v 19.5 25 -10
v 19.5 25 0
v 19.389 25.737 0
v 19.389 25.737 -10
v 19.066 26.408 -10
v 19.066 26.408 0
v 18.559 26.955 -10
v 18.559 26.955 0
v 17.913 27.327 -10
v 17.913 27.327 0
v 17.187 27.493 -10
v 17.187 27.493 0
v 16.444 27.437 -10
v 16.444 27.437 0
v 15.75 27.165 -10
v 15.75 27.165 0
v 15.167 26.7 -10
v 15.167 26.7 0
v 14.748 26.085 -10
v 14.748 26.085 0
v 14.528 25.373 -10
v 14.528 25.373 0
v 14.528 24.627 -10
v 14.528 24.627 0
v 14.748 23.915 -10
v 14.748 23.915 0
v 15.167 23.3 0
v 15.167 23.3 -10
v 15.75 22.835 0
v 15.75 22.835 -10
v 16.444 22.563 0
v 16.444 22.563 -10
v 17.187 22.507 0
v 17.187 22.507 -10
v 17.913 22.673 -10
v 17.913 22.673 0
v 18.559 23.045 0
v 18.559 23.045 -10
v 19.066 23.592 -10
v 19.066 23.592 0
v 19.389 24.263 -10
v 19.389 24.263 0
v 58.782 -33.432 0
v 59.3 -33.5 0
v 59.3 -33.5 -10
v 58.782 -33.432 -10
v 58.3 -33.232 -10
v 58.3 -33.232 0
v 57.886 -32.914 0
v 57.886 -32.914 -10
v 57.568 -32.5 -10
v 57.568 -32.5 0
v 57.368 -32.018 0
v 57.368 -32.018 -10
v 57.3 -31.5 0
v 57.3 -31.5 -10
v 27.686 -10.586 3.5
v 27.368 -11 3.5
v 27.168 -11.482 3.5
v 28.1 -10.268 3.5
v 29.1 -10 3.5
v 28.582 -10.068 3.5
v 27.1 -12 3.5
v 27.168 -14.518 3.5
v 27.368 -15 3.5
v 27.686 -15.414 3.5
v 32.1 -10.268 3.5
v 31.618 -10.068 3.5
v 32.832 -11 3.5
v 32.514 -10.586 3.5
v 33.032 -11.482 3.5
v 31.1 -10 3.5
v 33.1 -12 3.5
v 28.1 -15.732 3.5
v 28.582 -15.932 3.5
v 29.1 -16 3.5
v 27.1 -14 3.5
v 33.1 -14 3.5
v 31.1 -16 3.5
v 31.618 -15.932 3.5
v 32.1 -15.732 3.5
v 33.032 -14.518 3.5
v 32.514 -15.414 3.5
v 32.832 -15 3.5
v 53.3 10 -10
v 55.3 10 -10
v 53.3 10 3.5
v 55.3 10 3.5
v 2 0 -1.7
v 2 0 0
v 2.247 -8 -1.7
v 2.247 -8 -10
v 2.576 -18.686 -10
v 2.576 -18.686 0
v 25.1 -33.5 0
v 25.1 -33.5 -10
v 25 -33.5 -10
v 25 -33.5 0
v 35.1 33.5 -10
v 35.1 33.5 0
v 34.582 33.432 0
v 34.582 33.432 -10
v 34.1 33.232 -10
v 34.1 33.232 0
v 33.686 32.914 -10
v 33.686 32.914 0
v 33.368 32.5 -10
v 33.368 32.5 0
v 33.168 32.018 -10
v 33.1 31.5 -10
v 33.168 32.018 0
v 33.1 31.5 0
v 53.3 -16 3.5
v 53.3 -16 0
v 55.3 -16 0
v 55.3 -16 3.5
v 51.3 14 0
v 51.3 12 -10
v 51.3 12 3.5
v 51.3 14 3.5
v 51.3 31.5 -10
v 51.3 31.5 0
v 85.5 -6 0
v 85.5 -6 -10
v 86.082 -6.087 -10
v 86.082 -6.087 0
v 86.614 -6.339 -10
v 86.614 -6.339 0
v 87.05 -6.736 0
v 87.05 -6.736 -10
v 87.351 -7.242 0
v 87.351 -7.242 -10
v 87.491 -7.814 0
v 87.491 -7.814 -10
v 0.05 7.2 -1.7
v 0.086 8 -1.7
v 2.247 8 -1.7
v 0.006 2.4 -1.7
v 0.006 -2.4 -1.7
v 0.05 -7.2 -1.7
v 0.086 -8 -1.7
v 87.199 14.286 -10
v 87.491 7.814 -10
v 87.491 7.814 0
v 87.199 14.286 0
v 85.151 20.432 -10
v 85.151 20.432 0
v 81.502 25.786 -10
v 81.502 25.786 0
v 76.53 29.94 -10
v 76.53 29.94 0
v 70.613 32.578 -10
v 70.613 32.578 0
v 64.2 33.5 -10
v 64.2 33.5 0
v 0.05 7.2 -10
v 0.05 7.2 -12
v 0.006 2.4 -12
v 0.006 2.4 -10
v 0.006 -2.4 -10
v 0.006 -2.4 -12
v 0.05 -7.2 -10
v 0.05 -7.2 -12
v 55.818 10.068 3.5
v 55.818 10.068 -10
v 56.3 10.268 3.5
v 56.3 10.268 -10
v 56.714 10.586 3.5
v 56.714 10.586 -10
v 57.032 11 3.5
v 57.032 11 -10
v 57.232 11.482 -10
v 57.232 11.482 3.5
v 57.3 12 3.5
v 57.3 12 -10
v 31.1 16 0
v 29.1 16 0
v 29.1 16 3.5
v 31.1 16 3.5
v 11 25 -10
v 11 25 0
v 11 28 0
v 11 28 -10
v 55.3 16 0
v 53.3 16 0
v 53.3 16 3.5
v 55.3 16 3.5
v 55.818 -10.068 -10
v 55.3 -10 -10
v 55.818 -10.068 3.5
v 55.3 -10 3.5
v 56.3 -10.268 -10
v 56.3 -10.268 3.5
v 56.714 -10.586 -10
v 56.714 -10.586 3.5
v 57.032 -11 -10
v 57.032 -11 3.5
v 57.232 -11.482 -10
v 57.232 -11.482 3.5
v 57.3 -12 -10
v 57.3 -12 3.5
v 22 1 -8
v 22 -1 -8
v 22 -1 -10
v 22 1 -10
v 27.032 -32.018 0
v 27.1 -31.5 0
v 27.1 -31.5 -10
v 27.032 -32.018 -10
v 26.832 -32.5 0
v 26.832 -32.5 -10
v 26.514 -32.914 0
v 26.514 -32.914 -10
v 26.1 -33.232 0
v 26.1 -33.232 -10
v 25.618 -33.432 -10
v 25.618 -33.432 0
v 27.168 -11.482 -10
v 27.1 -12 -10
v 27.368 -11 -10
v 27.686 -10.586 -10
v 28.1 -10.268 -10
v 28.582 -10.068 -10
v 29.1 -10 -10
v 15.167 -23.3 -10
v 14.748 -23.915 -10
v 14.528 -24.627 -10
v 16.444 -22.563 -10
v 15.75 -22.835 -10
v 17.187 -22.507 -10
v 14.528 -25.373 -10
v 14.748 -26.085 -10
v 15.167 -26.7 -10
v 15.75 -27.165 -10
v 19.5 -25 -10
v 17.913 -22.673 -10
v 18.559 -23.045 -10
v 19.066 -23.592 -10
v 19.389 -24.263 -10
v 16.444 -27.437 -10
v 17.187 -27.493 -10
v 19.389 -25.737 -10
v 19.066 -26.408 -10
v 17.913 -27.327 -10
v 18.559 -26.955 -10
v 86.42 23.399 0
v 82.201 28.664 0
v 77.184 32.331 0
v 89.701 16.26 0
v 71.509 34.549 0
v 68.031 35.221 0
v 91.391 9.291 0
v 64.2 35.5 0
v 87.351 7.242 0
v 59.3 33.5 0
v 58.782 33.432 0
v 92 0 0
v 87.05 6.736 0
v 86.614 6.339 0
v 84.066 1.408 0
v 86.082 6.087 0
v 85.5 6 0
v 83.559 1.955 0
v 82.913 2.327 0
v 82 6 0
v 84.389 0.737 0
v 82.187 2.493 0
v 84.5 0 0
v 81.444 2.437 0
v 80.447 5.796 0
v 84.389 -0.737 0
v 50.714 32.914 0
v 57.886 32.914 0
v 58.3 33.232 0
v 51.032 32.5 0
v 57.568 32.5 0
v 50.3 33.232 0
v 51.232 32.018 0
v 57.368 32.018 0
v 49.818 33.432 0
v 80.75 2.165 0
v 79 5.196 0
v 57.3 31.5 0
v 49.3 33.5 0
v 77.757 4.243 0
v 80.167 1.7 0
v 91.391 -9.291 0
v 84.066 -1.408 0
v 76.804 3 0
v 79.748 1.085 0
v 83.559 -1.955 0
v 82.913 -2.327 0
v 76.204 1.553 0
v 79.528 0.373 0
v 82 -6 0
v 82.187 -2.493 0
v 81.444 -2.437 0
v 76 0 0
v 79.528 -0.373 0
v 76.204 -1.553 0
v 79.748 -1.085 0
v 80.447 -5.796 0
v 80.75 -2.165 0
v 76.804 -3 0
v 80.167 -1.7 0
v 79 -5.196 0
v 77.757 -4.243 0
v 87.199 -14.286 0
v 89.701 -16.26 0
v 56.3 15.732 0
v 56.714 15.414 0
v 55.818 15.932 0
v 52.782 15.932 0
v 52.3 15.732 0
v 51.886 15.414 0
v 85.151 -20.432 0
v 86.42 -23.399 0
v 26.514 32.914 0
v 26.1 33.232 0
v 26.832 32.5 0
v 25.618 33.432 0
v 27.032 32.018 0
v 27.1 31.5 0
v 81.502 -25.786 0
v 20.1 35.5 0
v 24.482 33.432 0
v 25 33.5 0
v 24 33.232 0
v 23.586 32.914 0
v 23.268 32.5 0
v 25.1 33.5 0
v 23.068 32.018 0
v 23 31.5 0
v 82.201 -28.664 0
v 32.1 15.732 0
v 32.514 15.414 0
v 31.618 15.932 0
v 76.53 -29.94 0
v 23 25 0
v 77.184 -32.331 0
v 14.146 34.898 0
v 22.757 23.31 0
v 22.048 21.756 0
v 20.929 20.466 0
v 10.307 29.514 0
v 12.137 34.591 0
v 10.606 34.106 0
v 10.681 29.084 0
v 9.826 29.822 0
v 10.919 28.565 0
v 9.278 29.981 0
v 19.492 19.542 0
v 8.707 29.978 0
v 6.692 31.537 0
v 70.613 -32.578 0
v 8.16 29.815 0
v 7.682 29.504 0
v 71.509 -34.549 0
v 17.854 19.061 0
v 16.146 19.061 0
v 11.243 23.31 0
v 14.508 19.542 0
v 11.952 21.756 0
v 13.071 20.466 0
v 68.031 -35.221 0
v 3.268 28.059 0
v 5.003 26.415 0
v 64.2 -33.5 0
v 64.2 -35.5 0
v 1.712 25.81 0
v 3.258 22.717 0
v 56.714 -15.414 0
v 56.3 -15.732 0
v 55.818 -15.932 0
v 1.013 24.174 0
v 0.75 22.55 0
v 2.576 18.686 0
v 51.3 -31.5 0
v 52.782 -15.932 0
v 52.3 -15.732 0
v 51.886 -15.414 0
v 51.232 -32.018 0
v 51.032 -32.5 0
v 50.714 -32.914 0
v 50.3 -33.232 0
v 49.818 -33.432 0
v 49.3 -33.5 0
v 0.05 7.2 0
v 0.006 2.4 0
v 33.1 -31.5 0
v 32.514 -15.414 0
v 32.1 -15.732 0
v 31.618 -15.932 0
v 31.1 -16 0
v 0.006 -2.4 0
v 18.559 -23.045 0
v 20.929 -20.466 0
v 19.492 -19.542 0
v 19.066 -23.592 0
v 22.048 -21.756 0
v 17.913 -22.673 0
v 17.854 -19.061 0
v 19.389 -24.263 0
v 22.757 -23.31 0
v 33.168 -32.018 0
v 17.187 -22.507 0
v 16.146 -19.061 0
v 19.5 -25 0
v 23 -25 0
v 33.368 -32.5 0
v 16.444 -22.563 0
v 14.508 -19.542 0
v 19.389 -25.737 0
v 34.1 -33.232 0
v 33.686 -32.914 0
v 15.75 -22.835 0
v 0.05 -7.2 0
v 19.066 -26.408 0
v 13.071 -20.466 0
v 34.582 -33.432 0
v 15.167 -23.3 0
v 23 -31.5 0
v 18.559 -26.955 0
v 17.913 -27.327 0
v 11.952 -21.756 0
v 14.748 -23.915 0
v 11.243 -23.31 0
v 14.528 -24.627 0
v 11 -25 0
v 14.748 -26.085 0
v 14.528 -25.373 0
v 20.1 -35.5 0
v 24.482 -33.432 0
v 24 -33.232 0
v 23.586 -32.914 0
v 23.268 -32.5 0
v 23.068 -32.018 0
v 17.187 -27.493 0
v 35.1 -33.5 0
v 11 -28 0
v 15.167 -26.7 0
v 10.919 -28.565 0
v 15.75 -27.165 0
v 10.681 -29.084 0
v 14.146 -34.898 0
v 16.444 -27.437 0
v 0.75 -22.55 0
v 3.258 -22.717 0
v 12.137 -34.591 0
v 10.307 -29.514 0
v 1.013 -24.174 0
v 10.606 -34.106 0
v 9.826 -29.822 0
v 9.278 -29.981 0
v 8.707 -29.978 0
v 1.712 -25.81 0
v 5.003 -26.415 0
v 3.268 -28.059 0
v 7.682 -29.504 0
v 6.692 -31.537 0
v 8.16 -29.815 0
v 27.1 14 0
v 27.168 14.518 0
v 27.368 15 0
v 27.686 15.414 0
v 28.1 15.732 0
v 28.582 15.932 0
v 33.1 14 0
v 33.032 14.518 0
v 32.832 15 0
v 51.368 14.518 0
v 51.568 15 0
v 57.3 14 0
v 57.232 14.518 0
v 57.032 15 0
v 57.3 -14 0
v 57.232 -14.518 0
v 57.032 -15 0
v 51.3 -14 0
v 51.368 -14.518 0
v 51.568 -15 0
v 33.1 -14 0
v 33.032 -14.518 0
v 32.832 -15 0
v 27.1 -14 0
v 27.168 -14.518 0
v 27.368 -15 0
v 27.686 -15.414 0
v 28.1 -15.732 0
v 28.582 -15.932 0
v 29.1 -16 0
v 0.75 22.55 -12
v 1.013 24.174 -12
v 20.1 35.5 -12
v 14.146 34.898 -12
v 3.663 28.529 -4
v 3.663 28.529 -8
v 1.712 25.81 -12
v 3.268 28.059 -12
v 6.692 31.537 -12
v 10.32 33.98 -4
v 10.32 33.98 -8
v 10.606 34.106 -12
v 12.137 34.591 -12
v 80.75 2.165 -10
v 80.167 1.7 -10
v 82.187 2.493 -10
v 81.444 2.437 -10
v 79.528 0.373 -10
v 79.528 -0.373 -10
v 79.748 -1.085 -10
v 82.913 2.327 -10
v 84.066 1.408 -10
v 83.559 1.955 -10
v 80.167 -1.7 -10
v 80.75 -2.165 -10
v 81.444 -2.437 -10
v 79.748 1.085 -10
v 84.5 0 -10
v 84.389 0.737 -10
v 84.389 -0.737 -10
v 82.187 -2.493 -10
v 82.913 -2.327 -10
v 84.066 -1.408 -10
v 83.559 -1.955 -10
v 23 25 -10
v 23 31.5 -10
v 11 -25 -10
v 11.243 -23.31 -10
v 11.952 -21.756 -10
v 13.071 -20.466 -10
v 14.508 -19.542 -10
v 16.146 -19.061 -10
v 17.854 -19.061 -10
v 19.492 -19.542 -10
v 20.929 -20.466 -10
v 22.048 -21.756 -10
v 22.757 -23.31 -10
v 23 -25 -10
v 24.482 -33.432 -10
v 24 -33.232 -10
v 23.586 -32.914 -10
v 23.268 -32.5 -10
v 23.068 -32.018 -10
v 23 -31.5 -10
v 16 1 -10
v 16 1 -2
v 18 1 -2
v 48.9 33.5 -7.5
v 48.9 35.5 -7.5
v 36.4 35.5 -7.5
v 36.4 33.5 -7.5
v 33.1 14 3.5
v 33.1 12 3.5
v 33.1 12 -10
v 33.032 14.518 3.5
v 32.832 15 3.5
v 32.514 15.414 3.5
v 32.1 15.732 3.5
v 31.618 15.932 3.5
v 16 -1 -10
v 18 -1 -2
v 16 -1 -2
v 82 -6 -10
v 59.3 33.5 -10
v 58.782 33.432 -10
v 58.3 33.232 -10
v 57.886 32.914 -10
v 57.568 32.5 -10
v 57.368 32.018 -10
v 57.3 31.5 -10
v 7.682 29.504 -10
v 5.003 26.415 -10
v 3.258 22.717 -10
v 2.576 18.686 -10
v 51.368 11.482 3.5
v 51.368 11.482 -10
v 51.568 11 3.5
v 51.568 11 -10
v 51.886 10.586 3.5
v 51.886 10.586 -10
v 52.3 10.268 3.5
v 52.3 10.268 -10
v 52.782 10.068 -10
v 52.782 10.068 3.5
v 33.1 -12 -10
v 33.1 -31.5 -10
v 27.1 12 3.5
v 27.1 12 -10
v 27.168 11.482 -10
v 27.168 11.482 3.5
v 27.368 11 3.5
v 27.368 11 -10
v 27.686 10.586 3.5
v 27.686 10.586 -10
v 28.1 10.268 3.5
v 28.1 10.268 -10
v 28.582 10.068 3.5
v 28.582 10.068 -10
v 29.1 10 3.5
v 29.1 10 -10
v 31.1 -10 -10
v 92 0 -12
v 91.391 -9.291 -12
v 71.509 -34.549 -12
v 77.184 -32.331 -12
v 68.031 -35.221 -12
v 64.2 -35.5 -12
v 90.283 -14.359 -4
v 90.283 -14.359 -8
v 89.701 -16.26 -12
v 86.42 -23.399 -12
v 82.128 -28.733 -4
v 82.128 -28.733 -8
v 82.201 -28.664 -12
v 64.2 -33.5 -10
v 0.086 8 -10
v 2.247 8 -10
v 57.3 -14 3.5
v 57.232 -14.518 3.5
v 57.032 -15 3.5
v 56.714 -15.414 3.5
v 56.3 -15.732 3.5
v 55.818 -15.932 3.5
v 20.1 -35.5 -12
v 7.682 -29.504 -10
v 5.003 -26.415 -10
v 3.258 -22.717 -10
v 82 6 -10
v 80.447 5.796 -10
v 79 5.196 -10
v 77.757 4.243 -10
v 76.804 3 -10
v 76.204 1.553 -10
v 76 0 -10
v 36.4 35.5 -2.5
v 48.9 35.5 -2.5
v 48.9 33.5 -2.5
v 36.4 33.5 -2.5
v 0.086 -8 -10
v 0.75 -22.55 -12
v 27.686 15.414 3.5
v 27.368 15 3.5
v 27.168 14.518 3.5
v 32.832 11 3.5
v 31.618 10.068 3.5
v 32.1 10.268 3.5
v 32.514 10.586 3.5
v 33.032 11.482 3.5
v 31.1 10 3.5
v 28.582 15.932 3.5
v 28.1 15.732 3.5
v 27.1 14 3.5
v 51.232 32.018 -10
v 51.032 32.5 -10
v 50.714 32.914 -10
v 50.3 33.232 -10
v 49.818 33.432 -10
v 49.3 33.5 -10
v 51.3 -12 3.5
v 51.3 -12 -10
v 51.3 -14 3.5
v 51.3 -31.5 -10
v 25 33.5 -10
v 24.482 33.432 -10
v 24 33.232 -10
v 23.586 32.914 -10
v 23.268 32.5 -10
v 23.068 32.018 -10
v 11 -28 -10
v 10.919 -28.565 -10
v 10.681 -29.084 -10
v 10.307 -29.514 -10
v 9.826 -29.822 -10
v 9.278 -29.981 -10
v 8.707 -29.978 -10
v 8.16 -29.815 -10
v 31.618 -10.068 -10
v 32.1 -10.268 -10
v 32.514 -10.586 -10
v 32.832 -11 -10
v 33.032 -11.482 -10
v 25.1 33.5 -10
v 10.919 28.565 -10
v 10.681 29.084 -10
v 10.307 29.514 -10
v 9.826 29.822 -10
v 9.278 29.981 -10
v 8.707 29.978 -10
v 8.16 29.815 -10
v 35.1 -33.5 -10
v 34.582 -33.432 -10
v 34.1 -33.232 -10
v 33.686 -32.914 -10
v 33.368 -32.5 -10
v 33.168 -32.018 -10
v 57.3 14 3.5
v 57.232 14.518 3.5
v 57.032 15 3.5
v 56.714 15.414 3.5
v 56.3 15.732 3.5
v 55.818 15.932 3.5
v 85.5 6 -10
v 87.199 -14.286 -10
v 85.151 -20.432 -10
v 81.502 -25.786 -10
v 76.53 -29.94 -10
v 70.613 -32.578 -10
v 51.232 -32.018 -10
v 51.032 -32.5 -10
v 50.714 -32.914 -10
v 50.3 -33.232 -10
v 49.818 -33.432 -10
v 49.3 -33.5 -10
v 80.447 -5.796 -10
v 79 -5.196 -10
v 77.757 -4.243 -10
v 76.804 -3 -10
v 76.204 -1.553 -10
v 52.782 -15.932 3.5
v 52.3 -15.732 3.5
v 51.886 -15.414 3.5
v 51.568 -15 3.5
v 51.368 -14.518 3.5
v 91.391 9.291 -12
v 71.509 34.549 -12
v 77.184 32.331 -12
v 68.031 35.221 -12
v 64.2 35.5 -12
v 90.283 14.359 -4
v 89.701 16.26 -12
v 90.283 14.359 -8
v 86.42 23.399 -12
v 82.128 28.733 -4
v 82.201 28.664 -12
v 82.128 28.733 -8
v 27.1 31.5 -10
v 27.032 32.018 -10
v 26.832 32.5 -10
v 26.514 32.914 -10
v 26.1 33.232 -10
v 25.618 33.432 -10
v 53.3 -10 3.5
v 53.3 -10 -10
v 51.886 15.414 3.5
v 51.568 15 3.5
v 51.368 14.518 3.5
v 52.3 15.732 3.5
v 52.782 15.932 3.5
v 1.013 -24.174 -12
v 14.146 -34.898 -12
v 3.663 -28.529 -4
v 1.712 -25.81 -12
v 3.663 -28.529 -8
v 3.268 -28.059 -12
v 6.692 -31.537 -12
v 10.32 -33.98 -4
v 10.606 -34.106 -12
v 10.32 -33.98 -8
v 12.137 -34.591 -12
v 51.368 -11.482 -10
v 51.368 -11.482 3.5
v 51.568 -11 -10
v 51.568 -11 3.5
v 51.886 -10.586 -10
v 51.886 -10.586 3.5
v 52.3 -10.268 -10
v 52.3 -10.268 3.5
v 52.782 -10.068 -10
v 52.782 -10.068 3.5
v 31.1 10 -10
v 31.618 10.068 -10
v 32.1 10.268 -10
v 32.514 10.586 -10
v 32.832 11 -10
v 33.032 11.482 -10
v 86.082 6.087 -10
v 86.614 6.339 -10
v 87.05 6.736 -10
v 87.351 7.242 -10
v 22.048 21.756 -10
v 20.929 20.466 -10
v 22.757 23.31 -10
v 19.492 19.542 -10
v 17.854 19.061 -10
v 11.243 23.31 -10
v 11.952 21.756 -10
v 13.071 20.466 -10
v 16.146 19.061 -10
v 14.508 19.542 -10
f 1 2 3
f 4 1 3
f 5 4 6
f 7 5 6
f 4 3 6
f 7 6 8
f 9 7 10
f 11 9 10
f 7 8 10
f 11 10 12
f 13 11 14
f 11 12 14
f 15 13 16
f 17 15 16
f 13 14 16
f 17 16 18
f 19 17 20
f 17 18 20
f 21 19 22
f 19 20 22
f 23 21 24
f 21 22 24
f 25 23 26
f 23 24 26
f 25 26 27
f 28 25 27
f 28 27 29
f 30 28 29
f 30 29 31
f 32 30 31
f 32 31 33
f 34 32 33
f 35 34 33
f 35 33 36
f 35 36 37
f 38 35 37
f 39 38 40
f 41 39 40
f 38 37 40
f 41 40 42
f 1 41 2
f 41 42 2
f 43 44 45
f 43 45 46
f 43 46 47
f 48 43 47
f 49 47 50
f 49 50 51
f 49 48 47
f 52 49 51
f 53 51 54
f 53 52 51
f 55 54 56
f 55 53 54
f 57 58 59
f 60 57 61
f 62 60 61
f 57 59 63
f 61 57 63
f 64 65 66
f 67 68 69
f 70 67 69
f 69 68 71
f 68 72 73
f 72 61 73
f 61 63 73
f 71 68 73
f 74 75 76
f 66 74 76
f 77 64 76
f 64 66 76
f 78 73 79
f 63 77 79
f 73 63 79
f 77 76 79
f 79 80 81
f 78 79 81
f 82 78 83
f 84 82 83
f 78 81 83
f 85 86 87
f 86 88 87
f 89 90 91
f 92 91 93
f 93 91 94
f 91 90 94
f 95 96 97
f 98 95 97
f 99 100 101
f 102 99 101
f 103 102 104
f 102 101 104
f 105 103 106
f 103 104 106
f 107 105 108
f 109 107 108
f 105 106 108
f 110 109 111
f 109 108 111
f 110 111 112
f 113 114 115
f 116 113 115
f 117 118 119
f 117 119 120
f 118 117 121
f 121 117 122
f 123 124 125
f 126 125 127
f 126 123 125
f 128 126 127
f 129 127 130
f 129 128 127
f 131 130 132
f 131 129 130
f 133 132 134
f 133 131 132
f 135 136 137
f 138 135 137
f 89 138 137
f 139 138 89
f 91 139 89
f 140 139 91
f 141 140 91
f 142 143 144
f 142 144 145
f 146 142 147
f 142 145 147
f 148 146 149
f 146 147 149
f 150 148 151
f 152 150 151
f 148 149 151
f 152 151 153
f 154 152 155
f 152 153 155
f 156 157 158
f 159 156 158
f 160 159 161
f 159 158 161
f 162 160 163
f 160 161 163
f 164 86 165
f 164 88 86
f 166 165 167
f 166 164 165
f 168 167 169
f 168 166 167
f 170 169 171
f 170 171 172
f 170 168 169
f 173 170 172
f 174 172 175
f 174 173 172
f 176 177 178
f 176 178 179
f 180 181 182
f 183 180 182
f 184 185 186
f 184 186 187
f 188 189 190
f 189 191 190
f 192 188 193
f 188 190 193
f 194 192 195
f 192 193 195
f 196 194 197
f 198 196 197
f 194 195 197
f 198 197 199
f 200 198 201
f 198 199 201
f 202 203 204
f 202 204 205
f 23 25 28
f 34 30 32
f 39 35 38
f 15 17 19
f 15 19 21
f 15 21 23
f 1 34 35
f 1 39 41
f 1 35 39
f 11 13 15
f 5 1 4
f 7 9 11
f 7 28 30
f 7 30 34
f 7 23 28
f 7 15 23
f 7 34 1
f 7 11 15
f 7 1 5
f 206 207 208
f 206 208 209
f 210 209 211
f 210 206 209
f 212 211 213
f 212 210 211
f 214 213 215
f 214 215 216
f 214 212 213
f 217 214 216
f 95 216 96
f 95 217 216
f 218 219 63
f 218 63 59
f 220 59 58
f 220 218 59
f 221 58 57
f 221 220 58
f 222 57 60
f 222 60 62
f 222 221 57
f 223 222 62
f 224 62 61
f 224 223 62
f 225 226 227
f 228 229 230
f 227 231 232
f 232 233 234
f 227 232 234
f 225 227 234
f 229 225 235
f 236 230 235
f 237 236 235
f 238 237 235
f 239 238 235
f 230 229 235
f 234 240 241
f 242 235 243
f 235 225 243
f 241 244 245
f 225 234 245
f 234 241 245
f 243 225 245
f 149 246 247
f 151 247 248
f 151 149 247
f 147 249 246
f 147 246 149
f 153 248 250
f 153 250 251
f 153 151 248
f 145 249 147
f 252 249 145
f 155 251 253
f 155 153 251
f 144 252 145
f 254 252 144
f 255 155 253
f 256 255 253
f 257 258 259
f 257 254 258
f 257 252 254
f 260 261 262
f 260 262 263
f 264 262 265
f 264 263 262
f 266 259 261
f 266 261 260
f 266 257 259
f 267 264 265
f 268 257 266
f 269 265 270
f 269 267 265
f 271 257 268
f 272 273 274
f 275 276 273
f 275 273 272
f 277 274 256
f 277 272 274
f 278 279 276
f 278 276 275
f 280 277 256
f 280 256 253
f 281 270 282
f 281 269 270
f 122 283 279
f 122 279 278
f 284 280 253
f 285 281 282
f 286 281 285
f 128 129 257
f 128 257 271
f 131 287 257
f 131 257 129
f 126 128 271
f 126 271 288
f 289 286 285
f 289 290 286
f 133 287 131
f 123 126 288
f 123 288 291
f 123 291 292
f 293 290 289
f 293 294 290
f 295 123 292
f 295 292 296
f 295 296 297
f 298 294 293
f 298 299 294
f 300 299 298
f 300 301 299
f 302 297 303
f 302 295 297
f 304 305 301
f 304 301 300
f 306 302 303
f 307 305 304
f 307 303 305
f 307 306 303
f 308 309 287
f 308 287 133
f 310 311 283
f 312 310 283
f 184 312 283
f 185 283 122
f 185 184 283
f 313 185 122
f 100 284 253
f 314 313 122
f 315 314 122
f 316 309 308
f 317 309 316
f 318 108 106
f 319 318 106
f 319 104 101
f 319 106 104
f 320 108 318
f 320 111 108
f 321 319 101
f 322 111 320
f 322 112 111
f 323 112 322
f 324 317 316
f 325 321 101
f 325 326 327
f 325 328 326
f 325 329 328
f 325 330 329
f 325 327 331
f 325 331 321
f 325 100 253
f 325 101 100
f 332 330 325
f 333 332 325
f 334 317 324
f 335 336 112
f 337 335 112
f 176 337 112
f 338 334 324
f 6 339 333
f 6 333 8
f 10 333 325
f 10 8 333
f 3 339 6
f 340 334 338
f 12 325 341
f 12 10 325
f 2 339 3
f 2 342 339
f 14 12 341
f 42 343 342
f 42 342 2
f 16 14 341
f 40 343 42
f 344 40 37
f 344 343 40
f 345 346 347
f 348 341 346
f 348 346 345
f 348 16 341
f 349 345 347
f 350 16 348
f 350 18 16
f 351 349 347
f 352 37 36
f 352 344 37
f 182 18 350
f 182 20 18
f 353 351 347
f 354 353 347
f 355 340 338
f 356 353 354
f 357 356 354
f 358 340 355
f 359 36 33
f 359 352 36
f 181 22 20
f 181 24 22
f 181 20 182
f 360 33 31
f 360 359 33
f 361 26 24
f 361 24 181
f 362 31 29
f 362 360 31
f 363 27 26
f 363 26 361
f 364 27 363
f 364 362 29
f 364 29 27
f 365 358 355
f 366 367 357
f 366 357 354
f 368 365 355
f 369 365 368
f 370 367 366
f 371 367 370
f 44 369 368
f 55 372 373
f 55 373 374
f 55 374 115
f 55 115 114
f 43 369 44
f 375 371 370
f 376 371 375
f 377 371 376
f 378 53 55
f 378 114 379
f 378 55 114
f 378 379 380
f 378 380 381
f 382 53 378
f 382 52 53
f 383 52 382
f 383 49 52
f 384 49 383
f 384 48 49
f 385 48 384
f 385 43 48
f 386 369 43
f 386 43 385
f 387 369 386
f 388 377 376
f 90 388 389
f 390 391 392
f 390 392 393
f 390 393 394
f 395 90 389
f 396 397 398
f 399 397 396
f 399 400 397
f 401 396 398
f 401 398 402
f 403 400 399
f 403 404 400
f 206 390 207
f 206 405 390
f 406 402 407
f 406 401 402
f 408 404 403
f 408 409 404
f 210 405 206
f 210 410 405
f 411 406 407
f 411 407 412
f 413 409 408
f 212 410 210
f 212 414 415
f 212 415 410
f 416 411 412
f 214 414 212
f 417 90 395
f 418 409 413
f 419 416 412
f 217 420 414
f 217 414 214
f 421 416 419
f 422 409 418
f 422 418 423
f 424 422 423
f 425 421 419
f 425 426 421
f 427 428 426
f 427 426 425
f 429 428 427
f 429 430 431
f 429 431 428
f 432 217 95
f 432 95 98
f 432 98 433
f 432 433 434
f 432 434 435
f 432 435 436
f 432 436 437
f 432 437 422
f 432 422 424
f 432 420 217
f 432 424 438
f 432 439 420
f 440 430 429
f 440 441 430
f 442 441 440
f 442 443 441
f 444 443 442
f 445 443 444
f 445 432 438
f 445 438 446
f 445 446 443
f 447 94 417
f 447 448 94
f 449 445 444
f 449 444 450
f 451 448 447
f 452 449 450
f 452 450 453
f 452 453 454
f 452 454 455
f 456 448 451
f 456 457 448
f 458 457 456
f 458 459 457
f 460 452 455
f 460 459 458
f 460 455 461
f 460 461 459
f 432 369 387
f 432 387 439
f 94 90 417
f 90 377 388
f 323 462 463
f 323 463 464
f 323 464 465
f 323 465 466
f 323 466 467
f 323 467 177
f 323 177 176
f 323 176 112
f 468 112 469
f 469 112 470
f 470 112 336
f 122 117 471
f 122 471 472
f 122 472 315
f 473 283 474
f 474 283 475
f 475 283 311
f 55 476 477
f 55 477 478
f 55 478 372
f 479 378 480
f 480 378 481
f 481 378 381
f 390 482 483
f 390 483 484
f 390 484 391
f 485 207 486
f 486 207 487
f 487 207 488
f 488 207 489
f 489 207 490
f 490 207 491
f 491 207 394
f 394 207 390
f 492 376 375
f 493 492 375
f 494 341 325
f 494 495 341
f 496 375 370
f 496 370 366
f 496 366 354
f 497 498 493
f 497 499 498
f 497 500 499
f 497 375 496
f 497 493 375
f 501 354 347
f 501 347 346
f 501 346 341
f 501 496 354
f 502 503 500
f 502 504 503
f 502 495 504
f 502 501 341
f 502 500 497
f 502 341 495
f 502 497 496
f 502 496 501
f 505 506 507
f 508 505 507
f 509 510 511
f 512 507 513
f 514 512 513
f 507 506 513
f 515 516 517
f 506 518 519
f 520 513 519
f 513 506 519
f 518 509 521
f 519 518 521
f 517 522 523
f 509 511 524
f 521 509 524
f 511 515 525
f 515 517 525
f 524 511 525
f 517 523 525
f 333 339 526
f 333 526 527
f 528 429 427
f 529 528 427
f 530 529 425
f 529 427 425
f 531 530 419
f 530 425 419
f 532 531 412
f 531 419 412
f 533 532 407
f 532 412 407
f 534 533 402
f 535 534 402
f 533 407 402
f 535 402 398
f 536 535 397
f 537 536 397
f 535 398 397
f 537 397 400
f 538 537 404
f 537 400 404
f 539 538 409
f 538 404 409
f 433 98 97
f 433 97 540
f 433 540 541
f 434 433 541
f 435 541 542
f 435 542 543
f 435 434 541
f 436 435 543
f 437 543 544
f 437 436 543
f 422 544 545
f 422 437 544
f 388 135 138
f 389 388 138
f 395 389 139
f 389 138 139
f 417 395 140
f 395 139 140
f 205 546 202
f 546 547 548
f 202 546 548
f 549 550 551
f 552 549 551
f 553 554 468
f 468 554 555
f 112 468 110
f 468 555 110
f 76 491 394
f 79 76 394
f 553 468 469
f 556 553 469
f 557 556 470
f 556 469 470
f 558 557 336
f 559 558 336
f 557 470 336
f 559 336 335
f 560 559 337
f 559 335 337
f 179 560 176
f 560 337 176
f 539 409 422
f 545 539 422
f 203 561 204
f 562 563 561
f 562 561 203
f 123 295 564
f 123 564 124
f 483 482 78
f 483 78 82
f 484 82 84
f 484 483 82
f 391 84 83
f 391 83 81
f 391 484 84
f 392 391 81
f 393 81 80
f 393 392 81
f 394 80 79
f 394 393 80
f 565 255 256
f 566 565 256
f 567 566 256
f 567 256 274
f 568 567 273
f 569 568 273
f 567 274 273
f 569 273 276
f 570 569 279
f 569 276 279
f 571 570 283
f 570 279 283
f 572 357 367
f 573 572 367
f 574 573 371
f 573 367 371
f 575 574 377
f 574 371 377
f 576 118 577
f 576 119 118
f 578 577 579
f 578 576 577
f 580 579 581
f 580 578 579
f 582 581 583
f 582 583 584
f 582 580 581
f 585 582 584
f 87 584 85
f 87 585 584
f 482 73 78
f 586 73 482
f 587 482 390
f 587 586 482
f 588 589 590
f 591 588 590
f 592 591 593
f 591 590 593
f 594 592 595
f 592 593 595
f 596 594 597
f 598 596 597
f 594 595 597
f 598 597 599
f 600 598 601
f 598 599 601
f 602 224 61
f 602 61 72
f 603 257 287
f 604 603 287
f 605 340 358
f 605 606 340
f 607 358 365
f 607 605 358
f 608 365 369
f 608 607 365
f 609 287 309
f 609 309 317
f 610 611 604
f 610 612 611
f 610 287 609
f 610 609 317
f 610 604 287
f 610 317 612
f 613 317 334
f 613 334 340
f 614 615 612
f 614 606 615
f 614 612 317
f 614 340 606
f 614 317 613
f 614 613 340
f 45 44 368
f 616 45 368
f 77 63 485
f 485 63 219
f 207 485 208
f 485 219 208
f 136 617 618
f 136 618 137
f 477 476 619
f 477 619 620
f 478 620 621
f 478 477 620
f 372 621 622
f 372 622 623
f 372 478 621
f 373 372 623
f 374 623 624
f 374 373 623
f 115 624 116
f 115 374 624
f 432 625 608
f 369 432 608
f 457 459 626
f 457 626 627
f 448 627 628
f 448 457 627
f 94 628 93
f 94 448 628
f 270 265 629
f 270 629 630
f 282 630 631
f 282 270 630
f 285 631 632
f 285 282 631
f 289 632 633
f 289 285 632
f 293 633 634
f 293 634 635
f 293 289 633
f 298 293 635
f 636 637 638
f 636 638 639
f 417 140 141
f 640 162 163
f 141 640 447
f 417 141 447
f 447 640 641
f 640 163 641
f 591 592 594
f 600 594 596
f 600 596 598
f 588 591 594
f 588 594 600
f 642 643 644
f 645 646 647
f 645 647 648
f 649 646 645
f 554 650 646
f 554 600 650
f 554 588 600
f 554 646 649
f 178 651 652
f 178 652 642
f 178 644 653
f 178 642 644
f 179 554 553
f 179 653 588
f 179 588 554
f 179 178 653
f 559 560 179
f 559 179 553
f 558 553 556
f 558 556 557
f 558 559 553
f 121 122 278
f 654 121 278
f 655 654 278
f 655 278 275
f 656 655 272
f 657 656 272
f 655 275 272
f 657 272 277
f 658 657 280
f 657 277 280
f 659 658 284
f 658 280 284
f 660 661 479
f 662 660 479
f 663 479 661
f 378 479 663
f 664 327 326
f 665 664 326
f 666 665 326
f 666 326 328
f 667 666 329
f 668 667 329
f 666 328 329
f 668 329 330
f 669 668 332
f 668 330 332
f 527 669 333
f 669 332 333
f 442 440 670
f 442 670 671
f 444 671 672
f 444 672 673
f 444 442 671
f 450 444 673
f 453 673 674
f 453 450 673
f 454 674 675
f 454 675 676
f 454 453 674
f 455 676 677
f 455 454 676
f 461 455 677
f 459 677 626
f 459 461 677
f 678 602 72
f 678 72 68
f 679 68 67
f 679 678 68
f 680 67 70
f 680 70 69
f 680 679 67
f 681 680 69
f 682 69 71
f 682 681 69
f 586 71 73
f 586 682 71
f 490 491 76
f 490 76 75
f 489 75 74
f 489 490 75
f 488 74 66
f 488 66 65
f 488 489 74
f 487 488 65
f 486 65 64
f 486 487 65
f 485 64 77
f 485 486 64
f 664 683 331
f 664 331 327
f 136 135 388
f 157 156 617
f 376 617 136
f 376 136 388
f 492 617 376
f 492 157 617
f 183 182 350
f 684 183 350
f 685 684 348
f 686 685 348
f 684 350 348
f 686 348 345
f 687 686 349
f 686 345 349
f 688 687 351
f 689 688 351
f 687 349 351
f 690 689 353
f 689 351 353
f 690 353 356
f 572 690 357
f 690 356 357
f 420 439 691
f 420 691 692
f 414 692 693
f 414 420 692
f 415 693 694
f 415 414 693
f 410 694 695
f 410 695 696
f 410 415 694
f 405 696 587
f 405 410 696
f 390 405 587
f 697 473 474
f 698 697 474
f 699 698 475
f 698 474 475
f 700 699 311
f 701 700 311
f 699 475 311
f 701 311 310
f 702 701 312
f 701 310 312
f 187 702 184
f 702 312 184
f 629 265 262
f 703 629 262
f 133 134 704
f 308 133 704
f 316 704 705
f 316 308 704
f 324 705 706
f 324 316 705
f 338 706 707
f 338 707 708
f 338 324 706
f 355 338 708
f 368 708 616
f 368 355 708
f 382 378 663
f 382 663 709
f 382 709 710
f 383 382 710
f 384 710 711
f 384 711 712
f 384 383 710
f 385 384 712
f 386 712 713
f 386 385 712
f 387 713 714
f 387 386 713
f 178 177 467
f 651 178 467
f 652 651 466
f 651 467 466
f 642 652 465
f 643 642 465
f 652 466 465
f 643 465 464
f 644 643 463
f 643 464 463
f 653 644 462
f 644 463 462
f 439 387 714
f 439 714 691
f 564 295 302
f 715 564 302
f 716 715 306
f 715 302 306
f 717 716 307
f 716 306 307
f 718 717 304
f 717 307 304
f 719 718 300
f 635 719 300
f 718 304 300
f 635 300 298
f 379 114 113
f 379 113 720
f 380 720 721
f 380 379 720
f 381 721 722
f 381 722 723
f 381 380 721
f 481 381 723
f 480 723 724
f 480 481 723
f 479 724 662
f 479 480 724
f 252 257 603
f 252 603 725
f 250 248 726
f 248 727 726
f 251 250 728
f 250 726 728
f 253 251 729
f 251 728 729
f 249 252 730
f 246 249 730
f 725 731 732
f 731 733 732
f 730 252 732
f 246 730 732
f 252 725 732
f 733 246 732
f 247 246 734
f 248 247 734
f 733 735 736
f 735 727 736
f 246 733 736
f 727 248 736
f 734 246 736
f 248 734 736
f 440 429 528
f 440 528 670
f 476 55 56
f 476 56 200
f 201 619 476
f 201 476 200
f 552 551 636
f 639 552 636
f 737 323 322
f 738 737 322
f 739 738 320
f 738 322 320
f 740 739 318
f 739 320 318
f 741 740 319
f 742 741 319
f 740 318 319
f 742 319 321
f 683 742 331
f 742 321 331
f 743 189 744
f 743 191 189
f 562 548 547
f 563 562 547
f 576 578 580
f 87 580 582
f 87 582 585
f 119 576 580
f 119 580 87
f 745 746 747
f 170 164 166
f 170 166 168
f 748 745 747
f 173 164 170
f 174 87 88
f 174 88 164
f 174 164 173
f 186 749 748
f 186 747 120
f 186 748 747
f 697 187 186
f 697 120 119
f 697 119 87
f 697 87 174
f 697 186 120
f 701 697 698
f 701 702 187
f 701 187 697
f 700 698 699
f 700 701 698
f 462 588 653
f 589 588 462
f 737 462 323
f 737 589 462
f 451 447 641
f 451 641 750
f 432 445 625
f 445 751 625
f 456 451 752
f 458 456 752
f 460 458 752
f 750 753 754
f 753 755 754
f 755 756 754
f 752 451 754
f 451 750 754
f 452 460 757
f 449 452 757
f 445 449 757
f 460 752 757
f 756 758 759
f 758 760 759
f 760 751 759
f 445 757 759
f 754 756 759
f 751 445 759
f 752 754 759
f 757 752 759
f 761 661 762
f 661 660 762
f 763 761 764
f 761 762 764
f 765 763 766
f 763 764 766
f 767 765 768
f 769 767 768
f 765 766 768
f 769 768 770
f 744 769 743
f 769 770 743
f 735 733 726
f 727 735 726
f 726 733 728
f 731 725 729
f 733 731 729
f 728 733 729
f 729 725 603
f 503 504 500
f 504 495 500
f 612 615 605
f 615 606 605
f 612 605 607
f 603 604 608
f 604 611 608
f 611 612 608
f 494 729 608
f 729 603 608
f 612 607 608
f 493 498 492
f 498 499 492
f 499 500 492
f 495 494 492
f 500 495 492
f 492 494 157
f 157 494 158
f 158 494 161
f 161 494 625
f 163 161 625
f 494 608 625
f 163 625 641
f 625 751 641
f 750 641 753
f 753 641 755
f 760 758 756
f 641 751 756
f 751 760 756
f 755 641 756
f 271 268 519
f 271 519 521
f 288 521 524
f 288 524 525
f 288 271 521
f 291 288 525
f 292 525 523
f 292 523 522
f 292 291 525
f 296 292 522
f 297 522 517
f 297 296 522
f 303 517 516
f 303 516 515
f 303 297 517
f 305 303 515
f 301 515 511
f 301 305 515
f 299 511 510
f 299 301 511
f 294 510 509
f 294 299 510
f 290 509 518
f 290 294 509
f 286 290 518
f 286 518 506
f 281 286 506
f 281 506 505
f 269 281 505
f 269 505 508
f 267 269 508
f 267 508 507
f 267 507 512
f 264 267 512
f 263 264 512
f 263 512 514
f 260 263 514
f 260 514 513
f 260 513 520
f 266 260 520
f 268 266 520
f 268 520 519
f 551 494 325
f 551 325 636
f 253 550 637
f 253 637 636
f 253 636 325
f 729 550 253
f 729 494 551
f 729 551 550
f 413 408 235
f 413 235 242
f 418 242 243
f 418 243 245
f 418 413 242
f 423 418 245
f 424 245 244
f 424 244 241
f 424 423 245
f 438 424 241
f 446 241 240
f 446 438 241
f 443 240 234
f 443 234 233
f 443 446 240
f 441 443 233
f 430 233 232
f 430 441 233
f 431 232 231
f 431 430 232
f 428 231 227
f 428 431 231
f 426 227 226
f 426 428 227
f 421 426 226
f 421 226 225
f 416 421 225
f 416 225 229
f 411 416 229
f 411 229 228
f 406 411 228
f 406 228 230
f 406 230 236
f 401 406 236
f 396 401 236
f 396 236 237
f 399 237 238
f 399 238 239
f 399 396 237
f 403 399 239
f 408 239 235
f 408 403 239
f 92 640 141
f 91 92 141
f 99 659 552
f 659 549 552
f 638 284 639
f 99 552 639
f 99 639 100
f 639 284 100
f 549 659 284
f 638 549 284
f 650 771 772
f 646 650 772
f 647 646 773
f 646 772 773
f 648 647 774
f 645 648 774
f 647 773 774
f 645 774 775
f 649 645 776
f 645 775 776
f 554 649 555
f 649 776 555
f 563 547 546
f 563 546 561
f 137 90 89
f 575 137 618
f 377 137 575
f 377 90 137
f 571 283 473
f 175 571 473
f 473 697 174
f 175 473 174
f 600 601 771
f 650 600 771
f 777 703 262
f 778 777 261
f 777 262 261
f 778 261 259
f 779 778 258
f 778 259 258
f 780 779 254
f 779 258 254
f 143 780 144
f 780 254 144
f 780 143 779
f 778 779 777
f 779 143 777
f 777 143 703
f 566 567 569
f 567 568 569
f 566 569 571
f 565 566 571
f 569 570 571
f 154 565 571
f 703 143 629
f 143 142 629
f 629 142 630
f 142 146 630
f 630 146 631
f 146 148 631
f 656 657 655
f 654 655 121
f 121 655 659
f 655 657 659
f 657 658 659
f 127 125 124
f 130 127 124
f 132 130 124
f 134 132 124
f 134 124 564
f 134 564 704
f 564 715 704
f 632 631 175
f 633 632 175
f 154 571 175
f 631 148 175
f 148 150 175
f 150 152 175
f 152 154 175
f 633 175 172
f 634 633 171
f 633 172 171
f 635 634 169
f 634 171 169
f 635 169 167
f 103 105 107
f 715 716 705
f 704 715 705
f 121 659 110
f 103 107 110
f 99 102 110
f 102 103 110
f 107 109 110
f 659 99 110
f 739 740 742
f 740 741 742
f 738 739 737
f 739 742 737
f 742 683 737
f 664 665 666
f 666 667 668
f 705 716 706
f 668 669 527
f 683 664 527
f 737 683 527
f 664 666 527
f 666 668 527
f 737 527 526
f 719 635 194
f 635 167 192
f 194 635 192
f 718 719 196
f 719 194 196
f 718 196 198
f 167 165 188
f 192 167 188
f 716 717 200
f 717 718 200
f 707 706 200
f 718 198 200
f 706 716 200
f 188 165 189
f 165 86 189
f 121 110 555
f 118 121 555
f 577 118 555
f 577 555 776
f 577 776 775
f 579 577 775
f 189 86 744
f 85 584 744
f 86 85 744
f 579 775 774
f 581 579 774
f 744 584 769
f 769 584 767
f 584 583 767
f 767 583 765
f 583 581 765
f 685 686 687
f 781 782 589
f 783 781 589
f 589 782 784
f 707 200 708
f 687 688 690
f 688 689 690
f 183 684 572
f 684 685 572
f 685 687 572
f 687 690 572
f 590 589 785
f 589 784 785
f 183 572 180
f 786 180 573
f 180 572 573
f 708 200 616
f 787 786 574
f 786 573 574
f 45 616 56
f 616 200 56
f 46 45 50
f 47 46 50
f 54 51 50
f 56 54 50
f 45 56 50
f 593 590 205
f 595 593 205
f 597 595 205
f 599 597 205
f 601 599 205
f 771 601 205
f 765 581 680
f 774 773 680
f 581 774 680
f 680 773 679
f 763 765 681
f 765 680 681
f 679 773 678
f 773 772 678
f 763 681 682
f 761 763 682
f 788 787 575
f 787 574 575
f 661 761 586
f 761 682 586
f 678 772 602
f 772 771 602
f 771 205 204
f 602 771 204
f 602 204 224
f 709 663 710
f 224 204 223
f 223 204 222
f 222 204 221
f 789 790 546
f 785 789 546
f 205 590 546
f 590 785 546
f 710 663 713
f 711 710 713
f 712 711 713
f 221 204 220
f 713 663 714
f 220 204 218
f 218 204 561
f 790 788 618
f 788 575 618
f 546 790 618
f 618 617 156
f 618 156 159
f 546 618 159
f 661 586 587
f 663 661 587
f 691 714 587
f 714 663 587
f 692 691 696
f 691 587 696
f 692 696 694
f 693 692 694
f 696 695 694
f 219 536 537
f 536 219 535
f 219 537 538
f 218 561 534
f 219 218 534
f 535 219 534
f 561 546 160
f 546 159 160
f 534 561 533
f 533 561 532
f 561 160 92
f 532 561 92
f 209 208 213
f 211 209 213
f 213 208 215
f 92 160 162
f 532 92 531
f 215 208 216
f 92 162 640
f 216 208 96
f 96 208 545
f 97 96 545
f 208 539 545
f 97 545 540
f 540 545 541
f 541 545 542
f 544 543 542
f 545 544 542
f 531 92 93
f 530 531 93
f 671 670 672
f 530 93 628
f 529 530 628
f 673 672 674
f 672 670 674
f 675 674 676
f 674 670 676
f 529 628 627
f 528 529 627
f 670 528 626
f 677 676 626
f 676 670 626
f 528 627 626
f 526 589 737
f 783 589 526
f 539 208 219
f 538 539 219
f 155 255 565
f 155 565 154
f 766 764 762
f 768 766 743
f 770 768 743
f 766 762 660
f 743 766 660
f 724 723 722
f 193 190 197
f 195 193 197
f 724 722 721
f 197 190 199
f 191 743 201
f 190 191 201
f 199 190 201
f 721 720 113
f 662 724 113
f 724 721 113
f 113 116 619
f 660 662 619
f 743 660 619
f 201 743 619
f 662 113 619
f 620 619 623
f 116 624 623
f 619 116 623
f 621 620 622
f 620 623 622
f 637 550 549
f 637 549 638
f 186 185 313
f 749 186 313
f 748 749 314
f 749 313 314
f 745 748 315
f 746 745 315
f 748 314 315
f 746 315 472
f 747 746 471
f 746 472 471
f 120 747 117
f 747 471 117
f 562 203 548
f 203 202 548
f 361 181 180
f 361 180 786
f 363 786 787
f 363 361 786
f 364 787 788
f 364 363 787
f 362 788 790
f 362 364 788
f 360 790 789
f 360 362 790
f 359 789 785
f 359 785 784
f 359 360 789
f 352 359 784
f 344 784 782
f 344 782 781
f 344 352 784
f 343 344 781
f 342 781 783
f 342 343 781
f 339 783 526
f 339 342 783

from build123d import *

# Parameters (mm, degrees)
PAD005_DEPTH    = 12
SKETCH025_R     = 2.5
POCKET019_DEPTH = 10
POCKET020_DEPTH = 1
SKETCH027_W     = 8
SKETCH027_H     = 8.3
POCKET021_DEPTH = 5
PAD006_DEPTH    = 3.5
SKETCH029_W     = 12.5
SKETCH029_H     = 5
POCKET022_DEPTH = 2


with BuildPart() as part:
    # Sketch024 → Pad005 (new body)
    with BuildSketch(Plane.XY):
        with BuildLine():
            ThreePointArc((0, 0), (0.0125001507, 3.6000868045), (0.05, 7.2))
            Line((0.05, 7.2), (0.75, 22.55))
            add(Edge.make_bspline(
                [(0.75, 22.55), (0.790433, 24.50555), (2.8995135699, 28.3383927733), (10.6468681476, 35.231617337), (14.5053016695, 34.8194742751), (20.1, 35.5)],
                knots=[0, 0, 0, 0, 0.3333333333, 0.6666666667, 1, 1, 1, 1], degree=3))
            Line((20.1, 35.5), (64.2, 35.5))
            add(Edge.make_bspline(
                [(92, 0), (92.391037, 11.810127), (88.126587, 35.076866), (64.2, 35.5)],
                knots=[0, 0, 0, 0, 1, 1, 1, 1], degree=3))
            Line((92, 0), (0, 0))
        make_face()
    extrude(amount=PAD005_DEPTH)

    # Sketch025 (on Face8 of Pad005) → Pocket019 (cut)
    with BuildSketch(Plane.XY.offset(12)):
        with Locations((17, 25)):
            Circle(SKETCH025_R)
        with BuildLine():
            ThreePointArc((84.5, 0), (82, 2.5), (79.5, 0))
            Line((79.5, 0), (84.5, 0))
        make_face()
        with BuildLine():
            Line((2, 0), (2.5758571429, 18.6857169977))
            ThreePointArc((7.6817324497, 29.5040514173), (4.0036624605, 24.625907301), (2.5758571429, 18.6857169977))
            ThreePointArc((11, 28), (9.8256709089, 29.8216112511), (7.6817324497, 29.5040514173))
            Line((11, 25), (11, 28))
            ThreePointArc((11, 25), (17, 19), (23, 25))
            Line((23, 25), (23, 31.5))
            ThreePointArc((25, 33.5), (23.5857864376, 32.9142135624), (23, 31.5))
            Line((25.1, 33.5), (25, 33.5))
            ThreePointArc((27.1, 31.5), (26.5142135624, 32.9142135624), (25.1, 33.5))
            Line((27.1, 12), (27.1, 31.5))
            ThreePointArc((27.1, 12), (27.6857864376, 10.5857864376), (29.1, 10))
            Line((31.1, 10), (29.1, 10))
            ThreePointArc((31.1, 10), (32.5142135624, 10.5857864376), (33.1, 12))
            Line((33.1, 31.5), (33.1, 12))
            ThreePointArc((35.1, 33.5), (33.6857864376, 32.9142135624), (33.1, 31.5))
            Line((49.3, 33.5), (35.1, 33.5))
            ThreePointArc((51.3, 31.5), (50.7142135624, 32.9142135624), (49.3, 33.5))
            Line((51.3, 12), (51.3, 31.5))
            ThreePointArc((51.3, 12), (51.8857864376, 10.5857864376), (53.3, 10))
            Line((55.3, 10), (53.3, 10))
            ThreePointArc((55.3, 10), (56.7142135624, 10.5857864376), (57.3, 12))
            Line((57.3, 31.4999999999), (57.3, 12))
            ThreePointArc((59.3, 33.4999999999), (57.8857864376, 32.9142135623), (57.3, 31.4999999999))
            Line((59.3, 33.5), (64.2, 33.5))
            ThreePointArc((87.491325765, 7.8139309331), (81.5019467421, 25.7859071373), (64.2, 33.5))
            ThreePointArc((85.5, 6), (86.8468225322, 6.521463877), (87.491325765, 7.8139309331))
            Line((82, 6), (85.5, 6))
            ThreePointArc((82, 6), (77.7573593129, 4.2426406871), (76, 0))
            Line((22, 0), (76, 0))
            Line((22, 1), (22, 0))
            Line((16, 1), (22, 1))
            Line((16, 0), (16, 1))
            Line((2, 0), (16, 0))
        make_face()
    extrude(amount=-POCKET019_DEPTH, mode=Mode.SUBTRACT)

    # Sketch026 (on Face3 of Pocket019) → Pocket020 (cut)
    with BuildSketch(Plane.XZ):
        Polygon((22, 12), (22, 4), (18, 10), (16, 10), (16, 12), align=None)
    extrude(amount=-POCKET020_DEPTH, mode=Mode.SUBTRACT)

    # Sketch027 → Pocket021 (cut)
    with BuildSketch(Plane.YZ):
        with Locations((4, 6.15)):
            Rectangle(SKETCH027_W, SKETCH027_H)
    extrude(amount=POCKET021_DEPTH, mode=Mode.SUBTRACT)

    # Sketch028 (on Face8 of Pocket021) → Pad006 (join)
    with BuildSketch(Plane.XY.offset(12)):
        with BuildLine():
            ThreePointArc((31.1, 10), (32.5142135624, 10.5857864376), (33.1, 12))
            Line((33.1, 12), (33.1, 14))
            ThreePointArc((33.1, 14), (32.5142135624, 15.4142135624), (31.1, 16))
            Line((29.1, 16), (31.1, 16))
            ThreePointArc((29.1, 16), (27.6857864376, 15.4142135624), (27.1, 14))
            Line((27.1, 12), (27.1, 14))
            ThreePointArc((27.1, 12), (27.6857864376, 10.5857864376), (29.1, 10))
            Line((29.1, 10), (31.1, 10))
        make_face()
        with BuildLine():
            ThreePointArc((51.3, 12), (51.8857864376, 10.5857864376), (53.3, 10))
            Line((53.3, 10), (55.3, 10))
            ThreePointArc((55.3, 10), (56.7142135624, 10.5857864376), (57.3, 12))
            Line((57.3, 12), (57.3, 14))
            ThreePointArc((57.3, 14), (56.7142135624, 15.4142135624), (55.3, 16))
            Line((53.3, 16), (55.3, 16))
            ThreePointArc((53.3, 16), (51.8857864376, 15.4142135624), (51.3, 14))
            Line((51.3, 12), (51.3, 14))
        make_face()
    extrude(amount=PAD006_DEPTH)

    # Mirrored002: part across XZ


with BuildPart() as part_1:
    add(part.part)
    add(part.part.mirror(Plane.XZ))

    # Sketch029 (on Face33 of Mirrored002) → Pocket022 (cut)
    with BuildSketch(Plane(origin=(0, 35.5, 0), x_dir=(-1, 0, 0), z_dir=(0, 1, 0))):
        with Locations((-42.65, 7)):
            Rectangle(SKETCH029_W, SKETCH029_H)
    extrude(amount=-POCKET022_DEPTH, mode=Mode.SUBTRACT)


with BuildPart() as part_2:
    # Body004 placement: moved
    add(part_1.part.moved(Location((0, 0, -12))))


solid = part_2.part
